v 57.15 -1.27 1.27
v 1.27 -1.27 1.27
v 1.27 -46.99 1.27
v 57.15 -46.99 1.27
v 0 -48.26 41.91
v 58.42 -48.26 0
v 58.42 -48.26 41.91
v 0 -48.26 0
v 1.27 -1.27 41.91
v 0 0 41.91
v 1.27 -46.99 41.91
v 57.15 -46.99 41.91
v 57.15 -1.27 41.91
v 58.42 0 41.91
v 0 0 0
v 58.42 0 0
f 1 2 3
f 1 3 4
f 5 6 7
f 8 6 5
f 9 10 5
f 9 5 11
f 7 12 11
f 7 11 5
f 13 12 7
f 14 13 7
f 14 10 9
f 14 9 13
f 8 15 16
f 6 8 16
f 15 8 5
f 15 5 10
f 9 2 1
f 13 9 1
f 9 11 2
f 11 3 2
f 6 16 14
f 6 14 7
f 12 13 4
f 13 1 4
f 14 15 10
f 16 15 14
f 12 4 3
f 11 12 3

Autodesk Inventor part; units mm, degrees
ref_plane "YZ Plane" through (0, 0, 0) normal (1, 0, 0) x (0, 1, 0)
ref_plane "XZ Plane" through (0, 0, 0) normal (0, 1, 0) x (-1, 0, 0)
ref_plane "XY Plane" through (0, 0, 0) normal (0, 0, 1) x (1, 0, 0)
sketch "Sketch1" plane through (0, 0, 0) normal (0, 0, 1) x (1, 0, 0)
  line L0 (0, 0) -> (58.42, 0)
  line L1 (58.42, 0) -> (58.42, -48.26)
  line L2 (58.42, -48.26) -> (0, -48.26)
  line L3 (0, -48.26) -> (0, 0)
  dimension "d0" = 58.42
  dimension "d1" = 48.26
extrude "Extrusion1" add sketch "Sketch1" along normal blind 1.27
sketch "Sketch2" plane through (0, 0, 1.27) normal (0, 0, 1) x (1, 0, 0)
  line L0 (58.42, 0) -> (0, 0) projected
  line L1 (0, 0) -> (0, -48.26) projected
  line L2 (0, -48.26) -> (58.42, -48.26) projected
  line L3 (58.42, -48.26) -> (58.42, 0) projected
  line L4 (1.27, -1.27) -> (57.15, -1.27)
  line L5 (57.15, -1.27) -> (57.15, -46.99)
  line L6 (57.15, -46.99) -> (1.27, -46.99)
  line L7 (1.27, -46.99) -> (1.27, -1.27)
  dimension "d4" = 1.27
  dimension "d5" = 1.27
  dimension "d6" = 1.27
  dimension "d7" = 1.27
extrude "Extrusion2" add sketch "Sketch2" along normal blind 40.64
properties part number "Box Bottom"
